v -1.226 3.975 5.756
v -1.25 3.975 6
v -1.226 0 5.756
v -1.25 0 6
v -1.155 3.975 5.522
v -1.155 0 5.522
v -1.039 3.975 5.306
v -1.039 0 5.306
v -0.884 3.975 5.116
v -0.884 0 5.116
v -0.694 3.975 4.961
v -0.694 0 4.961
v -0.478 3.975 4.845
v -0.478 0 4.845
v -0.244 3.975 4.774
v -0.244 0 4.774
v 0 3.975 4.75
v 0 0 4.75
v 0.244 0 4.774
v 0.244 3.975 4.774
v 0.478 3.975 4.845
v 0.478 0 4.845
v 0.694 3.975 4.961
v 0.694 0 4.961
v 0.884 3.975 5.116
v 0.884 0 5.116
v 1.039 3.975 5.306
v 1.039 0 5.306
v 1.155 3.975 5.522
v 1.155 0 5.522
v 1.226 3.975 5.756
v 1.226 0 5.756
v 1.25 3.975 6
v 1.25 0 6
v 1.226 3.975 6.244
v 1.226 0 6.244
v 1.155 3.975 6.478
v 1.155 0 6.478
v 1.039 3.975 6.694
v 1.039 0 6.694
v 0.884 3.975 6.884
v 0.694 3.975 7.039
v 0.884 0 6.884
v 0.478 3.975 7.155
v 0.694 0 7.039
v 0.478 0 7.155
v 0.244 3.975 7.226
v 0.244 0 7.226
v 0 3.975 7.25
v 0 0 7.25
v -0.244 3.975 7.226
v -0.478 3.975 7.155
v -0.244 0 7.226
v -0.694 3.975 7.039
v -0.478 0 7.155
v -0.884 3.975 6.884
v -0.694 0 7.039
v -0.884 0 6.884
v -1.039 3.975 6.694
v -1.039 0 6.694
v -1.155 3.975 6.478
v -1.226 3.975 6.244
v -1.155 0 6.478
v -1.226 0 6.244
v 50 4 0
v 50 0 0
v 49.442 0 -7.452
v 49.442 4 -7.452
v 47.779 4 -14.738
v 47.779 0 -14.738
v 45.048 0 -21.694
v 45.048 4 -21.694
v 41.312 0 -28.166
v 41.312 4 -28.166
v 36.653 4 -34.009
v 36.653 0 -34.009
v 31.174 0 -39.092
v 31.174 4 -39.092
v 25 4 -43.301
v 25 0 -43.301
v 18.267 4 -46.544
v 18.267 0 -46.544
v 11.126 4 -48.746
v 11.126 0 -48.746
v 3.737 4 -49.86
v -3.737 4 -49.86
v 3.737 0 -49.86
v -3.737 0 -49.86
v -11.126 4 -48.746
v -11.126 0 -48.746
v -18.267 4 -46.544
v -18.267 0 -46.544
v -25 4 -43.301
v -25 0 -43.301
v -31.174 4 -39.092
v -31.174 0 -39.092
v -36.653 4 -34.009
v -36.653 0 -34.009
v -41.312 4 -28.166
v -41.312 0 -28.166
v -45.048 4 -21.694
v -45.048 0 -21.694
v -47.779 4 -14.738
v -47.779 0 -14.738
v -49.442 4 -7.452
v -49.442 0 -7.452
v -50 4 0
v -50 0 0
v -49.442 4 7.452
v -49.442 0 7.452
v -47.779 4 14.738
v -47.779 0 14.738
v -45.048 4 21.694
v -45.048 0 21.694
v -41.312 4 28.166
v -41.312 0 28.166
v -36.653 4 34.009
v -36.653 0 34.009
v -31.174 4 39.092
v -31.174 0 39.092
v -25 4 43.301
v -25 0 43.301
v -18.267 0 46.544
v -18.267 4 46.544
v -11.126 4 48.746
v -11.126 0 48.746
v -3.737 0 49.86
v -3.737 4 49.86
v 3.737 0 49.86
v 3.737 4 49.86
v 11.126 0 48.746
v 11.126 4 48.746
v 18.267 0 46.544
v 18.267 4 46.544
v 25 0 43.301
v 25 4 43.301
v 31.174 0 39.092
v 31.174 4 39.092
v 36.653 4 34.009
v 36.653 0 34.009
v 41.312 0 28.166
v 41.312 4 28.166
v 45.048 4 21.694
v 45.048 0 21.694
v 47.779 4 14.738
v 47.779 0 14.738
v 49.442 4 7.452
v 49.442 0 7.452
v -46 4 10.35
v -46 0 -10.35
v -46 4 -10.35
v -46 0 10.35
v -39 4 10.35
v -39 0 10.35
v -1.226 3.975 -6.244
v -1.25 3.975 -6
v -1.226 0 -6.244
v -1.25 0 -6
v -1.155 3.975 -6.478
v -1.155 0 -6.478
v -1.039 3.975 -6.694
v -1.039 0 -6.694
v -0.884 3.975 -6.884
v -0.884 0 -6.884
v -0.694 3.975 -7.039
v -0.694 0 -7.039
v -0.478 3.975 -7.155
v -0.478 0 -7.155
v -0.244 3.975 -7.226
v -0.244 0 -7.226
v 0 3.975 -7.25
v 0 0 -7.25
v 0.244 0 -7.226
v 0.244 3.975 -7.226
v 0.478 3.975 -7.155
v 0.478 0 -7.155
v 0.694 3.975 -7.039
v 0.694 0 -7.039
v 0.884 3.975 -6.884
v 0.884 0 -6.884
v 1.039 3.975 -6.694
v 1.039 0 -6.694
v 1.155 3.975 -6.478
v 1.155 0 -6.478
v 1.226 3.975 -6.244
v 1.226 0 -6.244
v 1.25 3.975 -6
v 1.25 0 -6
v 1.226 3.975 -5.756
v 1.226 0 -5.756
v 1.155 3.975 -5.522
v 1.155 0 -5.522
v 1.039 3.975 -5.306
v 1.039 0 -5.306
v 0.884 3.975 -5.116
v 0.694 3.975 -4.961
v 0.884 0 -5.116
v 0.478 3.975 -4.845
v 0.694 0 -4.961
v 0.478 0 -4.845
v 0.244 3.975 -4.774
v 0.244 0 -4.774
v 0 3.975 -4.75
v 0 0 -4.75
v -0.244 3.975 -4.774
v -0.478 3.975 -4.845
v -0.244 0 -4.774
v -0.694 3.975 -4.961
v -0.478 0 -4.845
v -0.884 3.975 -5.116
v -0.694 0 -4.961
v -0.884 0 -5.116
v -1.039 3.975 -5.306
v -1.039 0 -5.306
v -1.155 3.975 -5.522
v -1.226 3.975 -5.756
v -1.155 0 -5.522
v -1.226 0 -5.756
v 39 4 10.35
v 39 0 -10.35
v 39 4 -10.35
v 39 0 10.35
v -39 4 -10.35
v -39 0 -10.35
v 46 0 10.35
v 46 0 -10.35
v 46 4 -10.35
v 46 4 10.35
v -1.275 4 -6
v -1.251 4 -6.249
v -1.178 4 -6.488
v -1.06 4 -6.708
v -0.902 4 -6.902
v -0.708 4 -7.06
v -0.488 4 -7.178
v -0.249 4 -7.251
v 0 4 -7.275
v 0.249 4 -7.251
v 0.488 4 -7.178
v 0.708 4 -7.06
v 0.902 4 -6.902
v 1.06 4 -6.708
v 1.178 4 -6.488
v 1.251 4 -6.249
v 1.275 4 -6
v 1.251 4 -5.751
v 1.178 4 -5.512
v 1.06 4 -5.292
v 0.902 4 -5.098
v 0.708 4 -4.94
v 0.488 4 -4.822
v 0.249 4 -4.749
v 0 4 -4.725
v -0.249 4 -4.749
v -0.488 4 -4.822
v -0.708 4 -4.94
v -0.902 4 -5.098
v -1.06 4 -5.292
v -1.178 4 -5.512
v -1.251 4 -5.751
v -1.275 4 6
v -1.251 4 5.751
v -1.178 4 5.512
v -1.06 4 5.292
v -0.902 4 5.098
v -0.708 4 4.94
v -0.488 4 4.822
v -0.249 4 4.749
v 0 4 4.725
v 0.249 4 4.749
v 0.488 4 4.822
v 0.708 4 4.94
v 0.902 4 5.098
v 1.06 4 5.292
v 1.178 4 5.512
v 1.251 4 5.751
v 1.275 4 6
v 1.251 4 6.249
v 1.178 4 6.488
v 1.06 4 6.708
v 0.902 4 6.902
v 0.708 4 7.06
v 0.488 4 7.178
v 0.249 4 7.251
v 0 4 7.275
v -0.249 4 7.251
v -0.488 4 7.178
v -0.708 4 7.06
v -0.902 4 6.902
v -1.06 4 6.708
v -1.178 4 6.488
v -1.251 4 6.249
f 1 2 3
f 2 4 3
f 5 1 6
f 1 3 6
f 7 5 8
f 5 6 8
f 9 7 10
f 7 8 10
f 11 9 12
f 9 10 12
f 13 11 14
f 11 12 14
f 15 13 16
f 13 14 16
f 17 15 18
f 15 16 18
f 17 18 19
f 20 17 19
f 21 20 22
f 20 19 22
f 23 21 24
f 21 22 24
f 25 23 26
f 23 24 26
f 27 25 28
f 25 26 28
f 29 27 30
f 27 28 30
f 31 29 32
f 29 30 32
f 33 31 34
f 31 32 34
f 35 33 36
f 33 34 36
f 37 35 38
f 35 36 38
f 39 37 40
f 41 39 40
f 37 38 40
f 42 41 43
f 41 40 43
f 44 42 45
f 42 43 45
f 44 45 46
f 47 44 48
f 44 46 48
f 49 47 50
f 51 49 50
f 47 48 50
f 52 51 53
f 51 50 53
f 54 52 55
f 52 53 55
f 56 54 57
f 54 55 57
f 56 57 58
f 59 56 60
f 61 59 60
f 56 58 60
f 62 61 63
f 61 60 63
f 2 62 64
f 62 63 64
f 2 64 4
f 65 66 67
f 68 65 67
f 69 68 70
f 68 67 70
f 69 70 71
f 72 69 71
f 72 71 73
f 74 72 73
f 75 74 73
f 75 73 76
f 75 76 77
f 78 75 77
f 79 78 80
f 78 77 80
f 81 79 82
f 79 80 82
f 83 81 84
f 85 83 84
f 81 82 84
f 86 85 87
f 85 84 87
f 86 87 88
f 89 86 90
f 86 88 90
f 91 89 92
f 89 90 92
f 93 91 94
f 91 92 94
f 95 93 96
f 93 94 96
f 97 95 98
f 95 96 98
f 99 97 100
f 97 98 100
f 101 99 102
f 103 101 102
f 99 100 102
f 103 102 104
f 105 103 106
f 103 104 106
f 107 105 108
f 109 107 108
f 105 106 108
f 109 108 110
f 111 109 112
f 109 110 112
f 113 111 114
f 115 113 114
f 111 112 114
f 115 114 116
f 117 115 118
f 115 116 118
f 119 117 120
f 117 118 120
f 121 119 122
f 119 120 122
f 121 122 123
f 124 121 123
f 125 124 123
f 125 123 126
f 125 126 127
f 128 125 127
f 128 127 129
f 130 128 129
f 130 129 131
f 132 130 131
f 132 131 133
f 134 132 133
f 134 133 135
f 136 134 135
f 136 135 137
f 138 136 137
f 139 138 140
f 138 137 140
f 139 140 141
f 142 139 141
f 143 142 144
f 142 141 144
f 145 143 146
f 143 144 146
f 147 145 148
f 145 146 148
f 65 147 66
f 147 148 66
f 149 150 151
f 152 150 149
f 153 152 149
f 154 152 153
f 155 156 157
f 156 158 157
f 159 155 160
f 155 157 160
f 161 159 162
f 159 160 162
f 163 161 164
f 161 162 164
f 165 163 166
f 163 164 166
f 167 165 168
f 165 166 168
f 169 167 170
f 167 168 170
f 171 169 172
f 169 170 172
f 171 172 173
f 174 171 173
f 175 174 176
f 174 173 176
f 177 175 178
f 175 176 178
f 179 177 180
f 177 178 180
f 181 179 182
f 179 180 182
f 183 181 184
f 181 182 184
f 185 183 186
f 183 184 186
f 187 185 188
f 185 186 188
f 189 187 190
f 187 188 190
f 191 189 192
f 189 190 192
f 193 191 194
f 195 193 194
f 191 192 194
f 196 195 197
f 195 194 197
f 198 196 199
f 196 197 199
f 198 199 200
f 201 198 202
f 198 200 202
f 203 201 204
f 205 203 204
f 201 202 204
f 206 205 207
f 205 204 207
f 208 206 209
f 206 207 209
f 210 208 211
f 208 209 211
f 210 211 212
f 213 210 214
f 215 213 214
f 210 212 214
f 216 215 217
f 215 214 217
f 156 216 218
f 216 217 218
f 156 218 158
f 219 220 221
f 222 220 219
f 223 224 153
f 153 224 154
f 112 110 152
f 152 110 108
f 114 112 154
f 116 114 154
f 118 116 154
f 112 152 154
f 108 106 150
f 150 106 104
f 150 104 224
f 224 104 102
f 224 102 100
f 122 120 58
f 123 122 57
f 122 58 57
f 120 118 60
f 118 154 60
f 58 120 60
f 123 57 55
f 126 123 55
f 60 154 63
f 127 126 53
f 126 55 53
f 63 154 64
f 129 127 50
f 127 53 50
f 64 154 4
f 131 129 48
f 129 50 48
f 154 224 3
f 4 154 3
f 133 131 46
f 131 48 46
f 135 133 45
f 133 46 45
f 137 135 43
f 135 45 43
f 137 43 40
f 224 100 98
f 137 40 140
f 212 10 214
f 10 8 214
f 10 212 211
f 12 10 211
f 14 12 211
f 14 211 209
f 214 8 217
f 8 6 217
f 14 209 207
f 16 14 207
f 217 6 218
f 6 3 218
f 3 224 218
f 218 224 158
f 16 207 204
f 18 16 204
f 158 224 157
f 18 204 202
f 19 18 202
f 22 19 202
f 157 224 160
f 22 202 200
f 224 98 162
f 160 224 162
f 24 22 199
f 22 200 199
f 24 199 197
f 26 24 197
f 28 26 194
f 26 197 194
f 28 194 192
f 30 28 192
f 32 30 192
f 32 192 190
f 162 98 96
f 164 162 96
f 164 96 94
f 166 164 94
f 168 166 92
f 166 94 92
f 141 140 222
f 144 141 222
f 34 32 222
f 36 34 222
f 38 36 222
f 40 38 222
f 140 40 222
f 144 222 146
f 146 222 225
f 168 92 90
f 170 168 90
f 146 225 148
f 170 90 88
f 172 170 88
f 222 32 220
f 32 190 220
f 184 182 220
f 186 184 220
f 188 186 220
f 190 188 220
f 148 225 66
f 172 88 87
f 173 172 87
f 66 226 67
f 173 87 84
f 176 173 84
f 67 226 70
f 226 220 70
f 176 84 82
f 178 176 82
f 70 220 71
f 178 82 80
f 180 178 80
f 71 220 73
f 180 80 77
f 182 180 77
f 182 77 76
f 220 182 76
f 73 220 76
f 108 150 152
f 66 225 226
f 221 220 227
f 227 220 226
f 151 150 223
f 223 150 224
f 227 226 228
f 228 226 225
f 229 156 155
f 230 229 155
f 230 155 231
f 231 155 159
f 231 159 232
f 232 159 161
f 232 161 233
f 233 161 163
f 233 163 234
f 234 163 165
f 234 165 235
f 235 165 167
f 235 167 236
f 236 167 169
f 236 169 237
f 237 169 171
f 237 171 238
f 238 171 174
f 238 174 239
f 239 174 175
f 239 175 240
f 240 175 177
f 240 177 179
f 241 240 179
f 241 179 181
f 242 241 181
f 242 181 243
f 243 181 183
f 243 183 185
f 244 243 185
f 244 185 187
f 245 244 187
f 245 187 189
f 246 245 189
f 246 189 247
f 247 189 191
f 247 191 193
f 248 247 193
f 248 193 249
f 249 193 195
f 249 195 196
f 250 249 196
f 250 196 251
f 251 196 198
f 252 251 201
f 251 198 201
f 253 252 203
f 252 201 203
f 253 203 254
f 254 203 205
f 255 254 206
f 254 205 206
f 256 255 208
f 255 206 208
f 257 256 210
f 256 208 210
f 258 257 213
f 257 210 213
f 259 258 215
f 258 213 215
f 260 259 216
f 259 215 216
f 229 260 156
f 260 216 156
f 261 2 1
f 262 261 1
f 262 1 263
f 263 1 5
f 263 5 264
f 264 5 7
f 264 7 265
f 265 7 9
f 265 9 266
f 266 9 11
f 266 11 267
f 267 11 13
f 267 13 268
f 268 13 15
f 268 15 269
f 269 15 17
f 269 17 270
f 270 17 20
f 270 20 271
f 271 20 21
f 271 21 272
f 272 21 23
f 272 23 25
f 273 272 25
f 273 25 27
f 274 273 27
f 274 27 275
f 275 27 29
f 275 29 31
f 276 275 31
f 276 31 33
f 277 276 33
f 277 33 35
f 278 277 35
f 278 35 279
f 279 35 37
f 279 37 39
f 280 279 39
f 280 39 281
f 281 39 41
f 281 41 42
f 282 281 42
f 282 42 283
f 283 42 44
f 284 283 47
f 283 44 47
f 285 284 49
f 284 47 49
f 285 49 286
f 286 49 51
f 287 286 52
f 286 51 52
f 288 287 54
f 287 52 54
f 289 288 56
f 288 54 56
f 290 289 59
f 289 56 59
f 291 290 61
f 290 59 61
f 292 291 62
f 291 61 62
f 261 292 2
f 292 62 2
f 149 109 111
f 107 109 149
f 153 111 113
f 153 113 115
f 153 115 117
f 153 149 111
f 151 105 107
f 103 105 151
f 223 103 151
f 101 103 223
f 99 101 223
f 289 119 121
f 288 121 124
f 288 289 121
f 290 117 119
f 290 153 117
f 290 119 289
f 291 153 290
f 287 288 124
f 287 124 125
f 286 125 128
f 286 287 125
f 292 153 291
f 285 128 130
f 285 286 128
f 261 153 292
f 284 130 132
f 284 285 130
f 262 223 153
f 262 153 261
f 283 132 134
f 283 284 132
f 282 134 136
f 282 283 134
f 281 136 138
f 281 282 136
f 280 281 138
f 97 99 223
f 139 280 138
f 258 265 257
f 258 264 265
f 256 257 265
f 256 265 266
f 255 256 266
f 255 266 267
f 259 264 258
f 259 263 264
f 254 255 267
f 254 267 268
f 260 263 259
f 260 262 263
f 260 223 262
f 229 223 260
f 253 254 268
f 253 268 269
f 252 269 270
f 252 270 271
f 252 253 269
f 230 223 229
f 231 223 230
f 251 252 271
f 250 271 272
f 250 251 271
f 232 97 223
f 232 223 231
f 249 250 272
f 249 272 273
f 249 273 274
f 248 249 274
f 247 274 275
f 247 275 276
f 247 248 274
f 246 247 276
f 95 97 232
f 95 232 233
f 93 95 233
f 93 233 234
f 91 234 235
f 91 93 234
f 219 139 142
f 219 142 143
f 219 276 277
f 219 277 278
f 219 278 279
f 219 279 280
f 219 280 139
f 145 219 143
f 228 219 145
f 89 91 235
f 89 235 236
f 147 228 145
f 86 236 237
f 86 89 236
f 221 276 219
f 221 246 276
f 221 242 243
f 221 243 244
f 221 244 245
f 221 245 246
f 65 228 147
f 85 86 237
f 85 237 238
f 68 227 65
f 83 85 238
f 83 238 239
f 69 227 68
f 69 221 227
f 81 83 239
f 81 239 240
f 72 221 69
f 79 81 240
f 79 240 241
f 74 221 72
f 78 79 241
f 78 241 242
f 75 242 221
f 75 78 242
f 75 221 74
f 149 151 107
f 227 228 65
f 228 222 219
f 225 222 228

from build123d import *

# Parameters (mm, degrees)
SKETCH2_R                             = 50
BOSS_EXTRUDE2_DEPTH                   = 4
TAP_DRILL_FOR_M3X0_5_TAP1_D           = 2.5
TAP_DRILL_FOR_M3X0_5_TAP1_CSINK_D     = 2.55
TAP_DRILL_FOR_M3X0_5_TAP1_CSINK_ANGLE = 90
SKETCH5_W                             = 7
SKETCH5_H                             = 20.7
CUT_EXTRUDE1_DEPTH                    = 10


with BuildPart() as part:
    # Sketch2 → Boss-Extrude2 (new body)
    with BuildSketch(Plane(origin=(0, 0, 0), x_dir=(1, 0, 0), z_dir=(0, 1, 0))):
        Circle(SKETCH2_R)
    extrude(amount=BOSS_EXTRUDE2_DEPTH)

    # Tap Drill for M3x0.5 Tap1 (through all)
    with Locations(Plane(origin=(0, 4, 0), x_dir=(1, 0, 0), z_dir=(0, 1, 0))):
        with Locations((0, 6), (0, -6)):
            CounterSinkHole(TAP_DRILL_FOR_M3X0_5_TAP1_D / 2, TAP_DRILL_FOR_M3X0_5_TAP1_CSINK_D / 2, counter_sink_angle=TAP_DRILL_FOR_M3X0_5_TAP1_CSINK_ANGLE)

    # Sketch5 → Cut-Extrude1 (cut)
    with BuildSketch(Plane.XZ):
        with Locations((-42.5, 0)):
            Rectangle(SKETCH5_W, SKETCH5_H)
        with Locations((42.5, 0)):
            Rectangle(SKETCH5_W, SKETCH5_H)
    extrude(amount=-CUT_EXTRUDE1_DEPTH, mode=Mode.SUBTRACT)


solid = part.part
